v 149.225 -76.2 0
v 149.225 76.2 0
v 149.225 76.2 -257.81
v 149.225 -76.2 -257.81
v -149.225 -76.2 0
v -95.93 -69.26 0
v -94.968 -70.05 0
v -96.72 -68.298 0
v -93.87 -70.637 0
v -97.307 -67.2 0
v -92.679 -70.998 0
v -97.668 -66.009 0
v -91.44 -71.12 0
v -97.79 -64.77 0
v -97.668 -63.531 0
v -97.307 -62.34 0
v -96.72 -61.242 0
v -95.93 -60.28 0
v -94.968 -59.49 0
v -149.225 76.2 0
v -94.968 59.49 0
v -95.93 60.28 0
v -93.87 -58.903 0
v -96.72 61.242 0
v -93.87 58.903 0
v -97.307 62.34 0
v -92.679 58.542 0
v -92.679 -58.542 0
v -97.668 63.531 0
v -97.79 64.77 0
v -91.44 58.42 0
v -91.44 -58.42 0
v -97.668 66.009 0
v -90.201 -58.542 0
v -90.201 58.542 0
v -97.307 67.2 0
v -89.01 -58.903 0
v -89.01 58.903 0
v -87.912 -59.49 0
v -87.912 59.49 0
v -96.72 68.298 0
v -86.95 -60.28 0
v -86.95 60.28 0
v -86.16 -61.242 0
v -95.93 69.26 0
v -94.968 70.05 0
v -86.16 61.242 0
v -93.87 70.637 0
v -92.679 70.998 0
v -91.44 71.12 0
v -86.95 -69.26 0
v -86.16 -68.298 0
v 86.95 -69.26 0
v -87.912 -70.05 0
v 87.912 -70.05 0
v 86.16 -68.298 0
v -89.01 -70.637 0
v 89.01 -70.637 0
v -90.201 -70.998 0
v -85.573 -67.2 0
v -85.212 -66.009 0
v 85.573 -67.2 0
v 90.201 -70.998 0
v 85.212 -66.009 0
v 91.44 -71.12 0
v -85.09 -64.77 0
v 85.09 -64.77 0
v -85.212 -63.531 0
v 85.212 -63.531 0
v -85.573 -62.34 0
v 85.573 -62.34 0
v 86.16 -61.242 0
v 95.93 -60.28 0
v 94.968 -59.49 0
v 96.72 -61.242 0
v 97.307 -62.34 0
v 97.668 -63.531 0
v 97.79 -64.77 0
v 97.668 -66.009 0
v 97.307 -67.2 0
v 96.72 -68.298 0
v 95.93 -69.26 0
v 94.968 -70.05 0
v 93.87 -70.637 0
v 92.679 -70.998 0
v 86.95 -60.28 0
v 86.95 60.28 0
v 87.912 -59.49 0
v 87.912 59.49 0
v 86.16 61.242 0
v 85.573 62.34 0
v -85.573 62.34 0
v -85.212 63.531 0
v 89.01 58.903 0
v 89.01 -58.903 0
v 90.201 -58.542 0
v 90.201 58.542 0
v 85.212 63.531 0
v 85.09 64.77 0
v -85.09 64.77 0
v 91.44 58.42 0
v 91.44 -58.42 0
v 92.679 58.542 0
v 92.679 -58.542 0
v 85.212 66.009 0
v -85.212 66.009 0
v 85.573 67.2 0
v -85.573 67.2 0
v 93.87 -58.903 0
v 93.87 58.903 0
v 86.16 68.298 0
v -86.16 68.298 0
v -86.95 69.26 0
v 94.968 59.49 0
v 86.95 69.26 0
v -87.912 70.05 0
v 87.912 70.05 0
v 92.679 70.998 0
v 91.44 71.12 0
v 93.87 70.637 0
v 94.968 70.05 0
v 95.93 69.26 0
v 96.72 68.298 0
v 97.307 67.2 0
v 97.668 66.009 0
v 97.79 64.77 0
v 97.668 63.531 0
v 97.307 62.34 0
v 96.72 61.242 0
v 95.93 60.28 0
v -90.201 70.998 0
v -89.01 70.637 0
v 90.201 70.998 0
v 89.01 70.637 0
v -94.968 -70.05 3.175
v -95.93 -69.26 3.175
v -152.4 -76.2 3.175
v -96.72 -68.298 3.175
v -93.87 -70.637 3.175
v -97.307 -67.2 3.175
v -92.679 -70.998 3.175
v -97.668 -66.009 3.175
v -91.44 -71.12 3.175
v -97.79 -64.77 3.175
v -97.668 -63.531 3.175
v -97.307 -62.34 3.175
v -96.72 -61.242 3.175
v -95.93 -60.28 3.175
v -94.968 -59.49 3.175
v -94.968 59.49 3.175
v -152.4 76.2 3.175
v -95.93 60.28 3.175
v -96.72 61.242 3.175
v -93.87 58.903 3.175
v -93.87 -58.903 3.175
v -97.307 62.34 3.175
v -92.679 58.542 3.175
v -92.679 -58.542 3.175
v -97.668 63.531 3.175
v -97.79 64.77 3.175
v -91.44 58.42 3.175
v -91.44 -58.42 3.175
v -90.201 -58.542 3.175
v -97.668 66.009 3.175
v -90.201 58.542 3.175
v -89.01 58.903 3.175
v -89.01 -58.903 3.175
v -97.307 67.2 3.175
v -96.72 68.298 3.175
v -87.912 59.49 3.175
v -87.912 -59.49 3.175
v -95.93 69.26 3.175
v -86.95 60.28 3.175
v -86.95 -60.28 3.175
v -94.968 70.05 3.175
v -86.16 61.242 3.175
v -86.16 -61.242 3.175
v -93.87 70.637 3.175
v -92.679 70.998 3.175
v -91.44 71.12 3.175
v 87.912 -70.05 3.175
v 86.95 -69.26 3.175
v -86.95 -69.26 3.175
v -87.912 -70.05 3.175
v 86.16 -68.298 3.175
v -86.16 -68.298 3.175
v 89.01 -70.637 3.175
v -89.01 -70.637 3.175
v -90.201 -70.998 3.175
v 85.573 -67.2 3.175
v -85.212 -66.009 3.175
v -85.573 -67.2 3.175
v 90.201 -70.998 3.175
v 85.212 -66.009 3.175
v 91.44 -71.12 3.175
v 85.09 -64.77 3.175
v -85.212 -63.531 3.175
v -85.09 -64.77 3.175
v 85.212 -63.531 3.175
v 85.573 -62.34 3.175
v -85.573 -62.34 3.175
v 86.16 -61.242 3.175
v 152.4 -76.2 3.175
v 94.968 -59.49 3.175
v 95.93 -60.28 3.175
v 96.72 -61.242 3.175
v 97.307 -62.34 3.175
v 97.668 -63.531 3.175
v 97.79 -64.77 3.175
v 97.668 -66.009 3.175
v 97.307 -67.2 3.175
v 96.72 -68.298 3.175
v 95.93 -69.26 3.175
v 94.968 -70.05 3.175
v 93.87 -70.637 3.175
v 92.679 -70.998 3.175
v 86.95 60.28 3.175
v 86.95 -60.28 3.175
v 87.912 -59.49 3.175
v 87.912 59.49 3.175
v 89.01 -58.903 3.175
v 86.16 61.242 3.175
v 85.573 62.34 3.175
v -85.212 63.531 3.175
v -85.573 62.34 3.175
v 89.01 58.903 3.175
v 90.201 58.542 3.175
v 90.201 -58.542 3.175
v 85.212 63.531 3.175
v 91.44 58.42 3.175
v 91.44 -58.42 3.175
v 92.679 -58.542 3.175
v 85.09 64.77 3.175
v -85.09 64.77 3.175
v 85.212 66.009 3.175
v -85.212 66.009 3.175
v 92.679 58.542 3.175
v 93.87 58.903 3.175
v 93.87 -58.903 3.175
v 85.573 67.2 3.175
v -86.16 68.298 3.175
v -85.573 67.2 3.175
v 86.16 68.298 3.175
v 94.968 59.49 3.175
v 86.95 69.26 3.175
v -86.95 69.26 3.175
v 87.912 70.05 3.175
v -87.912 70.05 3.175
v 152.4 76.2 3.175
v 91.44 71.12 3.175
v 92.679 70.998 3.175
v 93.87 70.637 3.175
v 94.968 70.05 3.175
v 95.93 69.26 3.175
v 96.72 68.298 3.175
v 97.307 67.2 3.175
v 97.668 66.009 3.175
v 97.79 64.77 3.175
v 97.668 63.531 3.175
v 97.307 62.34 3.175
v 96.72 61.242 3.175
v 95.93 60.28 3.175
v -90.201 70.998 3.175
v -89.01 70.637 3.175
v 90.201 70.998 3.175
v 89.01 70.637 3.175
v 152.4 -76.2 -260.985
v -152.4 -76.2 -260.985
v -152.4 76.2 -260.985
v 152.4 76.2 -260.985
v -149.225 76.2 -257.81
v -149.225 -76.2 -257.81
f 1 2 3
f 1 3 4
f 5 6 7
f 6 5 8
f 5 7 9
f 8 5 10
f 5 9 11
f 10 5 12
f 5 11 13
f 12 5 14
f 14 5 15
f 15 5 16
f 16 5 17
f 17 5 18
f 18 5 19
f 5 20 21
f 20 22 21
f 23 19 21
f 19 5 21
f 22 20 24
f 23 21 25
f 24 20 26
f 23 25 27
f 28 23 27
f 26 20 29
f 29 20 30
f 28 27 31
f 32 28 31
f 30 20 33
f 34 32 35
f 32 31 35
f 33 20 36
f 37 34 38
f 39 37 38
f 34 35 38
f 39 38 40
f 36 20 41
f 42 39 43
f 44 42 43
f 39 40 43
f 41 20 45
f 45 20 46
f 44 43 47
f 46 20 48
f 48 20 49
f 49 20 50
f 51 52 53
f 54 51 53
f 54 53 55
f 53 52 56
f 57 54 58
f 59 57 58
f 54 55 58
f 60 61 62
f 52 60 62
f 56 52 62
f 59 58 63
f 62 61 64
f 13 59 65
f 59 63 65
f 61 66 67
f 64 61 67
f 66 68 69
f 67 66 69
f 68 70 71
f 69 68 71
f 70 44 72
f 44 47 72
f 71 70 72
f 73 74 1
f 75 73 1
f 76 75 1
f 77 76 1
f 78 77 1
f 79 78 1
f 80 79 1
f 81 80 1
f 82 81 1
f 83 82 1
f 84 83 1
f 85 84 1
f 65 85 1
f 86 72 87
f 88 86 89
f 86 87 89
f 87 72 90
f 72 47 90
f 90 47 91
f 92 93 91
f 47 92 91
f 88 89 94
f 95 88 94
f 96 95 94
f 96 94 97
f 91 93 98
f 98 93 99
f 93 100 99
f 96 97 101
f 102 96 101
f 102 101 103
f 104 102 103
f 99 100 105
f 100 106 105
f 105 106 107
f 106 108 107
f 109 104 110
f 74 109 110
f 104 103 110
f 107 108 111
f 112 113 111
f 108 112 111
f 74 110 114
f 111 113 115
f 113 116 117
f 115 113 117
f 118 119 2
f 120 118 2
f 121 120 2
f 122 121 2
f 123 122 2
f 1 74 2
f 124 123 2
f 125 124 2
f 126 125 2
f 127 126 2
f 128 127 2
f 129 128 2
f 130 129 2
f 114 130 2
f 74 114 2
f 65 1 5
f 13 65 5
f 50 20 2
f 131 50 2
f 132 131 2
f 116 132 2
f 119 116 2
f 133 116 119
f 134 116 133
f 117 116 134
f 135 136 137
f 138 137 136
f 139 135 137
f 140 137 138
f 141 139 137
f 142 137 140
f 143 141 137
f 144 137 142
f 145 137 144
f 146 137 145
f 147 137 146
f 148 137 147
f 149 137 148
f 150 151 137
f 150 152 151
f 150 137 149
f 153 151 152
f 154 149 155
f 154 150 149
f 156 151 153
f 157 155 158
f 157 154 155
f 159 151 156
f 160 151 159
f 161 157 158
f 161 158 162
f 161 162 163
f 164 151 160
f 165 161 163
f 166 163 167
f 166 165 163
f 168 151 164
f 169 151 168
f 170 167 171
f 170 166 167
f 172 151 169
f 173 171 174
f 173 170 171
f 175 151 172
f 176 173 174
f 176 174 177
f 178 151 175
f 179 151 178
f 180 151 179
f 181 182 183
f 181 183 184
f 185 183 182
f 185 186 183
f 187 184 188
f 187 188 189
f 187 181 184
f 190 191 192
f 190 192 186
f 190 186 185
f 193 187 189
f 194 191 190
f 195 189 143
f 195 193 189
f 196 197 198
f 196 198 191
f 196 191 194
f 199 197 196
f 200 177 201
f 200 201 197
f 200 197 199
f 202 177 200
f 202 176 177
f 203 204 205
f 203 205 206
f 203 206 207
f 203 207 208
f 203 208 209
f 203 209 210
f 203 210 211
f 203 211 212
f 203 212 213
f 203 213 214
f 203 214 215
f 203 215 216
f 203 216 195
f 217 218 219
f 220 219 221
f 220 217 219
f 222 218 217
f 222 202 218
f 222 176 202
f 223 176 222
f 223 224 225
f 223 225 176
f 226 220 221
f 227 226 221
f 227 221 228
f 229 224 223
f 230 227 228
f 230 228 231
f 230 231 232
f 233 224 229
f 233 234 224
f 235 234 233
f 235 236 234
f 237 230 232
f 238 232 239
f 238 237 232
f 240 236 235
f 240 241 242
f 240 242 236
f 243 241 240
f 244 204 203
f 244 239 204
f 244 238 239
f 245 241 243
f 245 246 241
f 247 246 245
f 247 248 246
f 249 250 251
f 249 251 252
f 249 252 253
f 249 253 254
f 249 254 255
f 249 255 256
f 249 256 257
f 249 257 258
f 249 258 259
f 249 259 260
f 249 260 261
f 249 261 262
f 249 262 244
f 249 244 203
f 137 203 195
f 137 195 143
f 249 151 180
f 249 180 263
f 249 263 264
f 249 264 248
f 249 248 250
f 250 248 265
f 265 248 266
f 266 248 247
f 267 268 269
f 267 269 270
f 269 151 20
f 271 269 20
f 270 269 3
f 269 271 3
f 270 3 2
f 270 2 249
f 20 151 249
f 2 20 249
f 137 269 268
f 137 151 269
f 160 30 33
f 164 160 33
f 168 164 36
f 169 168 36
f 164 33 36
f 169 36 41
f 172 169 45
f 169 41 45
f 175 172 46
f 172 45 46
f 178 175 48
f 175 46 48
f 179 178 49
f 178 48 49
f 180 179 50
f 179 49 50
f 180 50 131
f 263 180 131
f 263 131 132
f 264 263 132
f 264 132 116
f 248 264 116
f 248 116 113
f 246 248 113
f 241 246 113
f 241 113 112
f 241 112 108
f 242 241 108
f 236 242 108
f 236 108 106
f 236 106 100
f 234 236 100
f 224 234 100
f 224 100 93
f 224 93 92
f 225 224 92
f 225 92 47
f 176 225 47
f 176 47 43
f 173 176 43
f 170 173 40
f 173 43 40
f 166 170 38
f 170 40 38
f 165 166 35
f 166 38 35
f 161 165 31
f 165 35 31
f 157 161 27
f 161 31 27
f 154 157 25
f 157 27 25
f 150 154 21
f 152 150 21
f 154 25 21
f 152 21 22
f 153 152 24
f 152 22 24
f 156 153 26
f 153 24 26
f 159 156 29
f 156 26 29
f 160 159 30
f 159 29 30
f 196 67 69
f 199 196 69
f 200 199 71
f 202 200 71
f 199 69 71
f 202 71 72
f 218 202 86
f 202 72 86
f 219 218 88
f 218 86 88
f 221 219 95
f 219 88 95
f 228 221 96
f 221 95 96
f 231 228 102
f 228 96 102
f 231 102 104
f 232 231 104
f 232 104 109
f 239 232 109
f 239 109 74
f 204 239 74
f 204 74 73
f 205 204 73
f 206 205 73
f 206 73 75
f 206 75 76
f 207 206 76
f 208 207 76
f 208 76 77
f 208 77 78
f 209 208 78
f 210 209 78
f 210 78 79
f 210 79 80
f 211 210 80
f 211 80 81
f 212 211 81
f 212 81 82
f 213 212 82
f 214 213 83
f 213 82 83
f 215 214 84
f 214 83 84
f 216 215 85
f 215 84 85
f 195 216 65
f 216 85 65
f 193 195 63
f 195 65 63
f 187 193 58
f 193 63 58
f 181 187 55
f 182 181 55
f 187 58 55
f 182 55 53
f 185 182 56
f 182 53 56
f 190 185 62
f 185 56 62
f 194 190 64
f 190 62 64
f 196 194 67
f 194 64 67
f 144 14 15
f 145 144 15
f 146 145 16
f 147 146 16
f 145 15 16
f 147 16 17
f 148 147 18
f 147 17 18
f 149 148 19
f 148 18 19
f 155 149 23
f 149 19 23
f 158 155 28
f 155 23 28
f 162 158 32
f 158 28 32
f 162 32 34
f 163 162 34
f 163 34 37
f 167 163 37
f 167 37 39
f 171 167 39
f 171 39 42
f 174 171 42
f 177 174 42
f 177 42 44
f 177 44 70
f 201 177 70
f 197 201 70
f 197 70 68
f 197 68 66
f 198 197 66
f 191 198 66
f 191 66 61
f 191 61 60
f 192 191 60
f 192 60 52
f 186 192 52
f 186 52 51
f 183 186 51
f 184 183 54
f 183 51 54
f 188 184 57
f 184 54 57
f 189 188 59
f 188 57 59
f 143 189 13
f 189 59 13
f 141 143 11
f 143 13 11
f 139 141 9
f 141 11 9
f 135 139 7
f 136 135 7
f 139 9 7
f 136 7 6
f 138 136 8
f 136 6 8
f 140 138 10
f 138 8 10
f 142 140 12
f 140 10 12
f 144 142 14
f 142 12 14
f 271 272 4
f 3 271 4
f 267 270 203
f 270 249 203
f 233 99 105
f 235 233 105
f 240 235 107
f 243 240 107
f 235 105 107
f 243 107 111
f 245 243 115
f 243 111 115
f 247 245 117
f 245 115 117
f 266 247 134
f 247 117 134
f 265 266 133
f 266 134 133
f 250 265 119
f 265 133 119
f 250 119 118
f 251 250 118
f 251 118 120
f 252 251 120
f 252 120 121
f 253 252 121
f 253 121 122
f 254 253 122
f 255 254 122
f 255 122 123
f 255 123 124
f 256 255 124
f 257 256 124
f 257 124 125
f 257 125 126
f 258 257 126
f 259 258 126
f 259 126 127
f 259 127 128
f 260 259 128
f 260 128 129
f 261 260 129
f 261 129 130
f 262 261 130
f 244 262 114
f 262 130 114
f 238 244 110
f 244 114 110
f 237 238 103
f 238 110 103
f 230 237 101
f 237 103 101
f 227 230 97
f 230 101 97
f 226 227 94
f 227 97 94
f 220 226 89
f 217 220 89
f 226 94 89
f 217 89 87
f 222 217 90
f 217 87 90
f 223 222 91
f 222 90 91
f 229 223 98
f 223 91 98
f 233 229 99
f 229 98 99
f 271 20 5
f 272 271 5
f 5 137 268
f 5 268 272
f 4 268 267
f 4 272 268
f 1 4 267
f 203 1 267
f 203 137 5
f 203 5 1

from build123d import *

# Parameters (mm, degrees)
F0_W     = 304.8
F0_H     = 152.4
F1_DEPTH = 3.175
F4_D     = 12.7
F5_W     = 3.175
F5_H     = 152.4
F6_DEPTH = 257.81
F7_W     = 304.8
F7_H     = 152.4
F8_DEPTH = 3.175


# Not quite as in the source:
# - a length typed as a fraction of an inch, garbled in the dataset ("3 / 203.2 mm" for 3/8 in), is restored


with BuildPart() as f1:
    # F0 (on Top) → F1 (new body)
    with BuildSketch(Plane.XY):
        Rectangle(F0_W, F0_H)
    extrude(amount=F1_DEPTH)

    # F4 (through all)
    with Locations(Plane.XY.offset(3.175)):
        with Locations((-91.44, 64.77), (-91.44, -64.77), (91.44, -64.77), (91.44, 64.77)):
            Hole(F4_D / 2)

    # F5 (on face) → F6 (join)
    with BuildSketch(Plane(origin=(0, 0, 0), x_dir=(1, 0, 0), z_dir=(0, 0, -1))):
        with Locations((-150.8125, 0)):
            Rectangle(F5_W, F5_H)
        with Locations((150.8125, 0)):
            Rectangle(F5_W, F5_H)
    extrude(amount=F6_DEPTH)

    # F7 (on face) → F8 (join)
    with BuildSketch(Plane(origin=(0, 0, -257.81), x_dir=(1, 0, 0), z_dir=(0, 0, -1))):
        Rectangle(F7_W, F7_H)
    extrude(amount=F8_DEPTH)


solid = f1.part
